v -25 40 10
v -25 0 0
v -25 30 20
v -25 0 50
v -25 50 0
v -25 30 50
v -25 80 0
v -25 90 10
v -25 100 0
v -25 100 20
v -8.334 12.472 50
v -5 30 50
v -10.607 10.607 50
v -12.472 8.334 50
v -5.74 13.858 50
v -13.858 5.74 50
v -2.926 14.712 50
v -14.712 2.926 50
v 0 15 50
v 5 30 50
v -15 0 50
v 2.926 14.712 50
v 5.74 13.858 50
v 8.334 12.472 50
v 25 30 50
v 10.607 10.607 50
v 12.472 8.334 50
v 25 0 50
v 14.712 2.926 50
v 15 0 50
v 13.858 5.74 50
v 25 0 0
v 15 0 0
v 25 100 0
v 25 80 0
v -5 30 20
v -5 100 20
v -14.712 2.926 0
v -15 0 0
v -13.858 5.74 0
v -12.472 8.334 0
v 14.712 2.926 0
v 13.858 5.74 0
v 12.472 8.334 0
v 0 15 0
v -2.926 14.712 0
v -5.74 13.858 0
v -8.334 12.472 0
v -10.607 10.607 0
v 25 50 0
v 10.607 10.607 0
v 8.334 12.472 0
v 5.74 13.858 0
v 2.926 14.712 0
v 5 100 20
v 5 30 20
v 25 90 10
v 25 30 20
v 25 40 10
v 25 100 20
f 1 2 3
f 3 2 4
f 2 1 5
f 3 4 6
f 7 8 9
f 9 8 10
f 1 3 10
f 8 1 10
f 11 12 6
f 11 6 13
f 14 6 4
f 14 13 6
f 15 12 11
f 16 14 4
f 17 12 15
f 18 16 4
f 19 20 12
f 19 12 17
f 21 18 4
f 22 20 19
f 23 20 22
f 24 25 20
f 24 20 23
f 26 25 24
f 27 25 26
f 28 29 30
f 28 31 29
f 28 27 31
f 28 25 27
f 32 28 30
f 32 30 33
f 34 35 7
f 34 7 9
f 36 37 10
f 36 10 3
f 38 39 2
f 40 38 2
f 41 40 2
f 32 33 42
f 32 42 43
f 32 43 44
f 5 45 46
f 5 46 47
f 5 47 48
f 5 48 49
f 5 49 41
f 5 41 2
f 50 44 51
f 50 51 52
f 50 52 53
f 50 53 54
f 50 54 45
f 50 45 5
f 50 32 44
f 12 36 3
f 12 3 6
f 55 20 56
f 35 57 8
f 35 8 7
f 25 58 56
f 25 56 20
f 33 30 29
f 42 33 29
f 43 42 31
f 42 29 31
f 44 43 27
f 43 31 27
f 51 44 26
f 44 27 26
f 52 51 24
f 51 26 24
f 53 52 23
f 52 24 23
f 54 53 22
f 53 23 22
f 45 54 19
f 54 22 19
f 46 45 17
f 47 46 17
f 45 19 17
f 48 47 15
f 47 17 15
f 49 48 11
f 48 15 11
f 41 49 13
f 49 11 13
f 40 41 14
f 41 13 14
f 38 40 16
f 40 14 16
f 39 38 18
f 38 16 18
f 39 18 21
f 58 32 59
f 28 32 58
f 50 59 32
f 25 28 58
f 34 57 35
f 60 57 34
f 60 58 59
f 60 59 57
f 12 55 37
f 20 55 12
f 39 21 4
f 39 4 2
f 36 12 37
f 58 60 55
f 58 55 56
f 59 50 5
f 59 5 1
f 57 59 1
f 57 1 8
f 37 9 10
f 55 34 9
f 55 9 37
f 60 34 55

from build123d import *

# Parameters (mm, degrees)
PAD_DEPTH    = 25
SKETCH001_R  = 15
POCKET_DEPTH = 50.001
PAD001_DEPTH = 5


with BuildPart() as part:
    # Sketch → Pad (new body, symmetric)
    with BuildSketch(Plane.YZ):
        Polygon((0, 50), (0, 0), (50, 0), (40, 10), (90, 10), (80, 0), (100, 0), (100, 20), (30, 20), (30, 50), align=None)
    extrude(amount=PAD_DEPTH, both=True)

    # Sketch001 (on Face10 of Pad) → Pocket (cut, through all)
    with BuildSketch(Plane(origin=(0, 0, 50), x_dir=(0, -1, 0), z_dir=(0, 0, 1))):
        Circle(SKETCH001_R)
    extrude(amount=-POCKET_DEPTH, mode=Mode.SUBTRACT)

    # Sketch002 → Pad001 (join, symmetric)
    with BuildSketch(Plane.YZ):
        Polygon((30, 50), (30, 20), (100, 20), align=None)
    extrude(amount=PAD001_DEPTH, both=True)


solid = part.part
